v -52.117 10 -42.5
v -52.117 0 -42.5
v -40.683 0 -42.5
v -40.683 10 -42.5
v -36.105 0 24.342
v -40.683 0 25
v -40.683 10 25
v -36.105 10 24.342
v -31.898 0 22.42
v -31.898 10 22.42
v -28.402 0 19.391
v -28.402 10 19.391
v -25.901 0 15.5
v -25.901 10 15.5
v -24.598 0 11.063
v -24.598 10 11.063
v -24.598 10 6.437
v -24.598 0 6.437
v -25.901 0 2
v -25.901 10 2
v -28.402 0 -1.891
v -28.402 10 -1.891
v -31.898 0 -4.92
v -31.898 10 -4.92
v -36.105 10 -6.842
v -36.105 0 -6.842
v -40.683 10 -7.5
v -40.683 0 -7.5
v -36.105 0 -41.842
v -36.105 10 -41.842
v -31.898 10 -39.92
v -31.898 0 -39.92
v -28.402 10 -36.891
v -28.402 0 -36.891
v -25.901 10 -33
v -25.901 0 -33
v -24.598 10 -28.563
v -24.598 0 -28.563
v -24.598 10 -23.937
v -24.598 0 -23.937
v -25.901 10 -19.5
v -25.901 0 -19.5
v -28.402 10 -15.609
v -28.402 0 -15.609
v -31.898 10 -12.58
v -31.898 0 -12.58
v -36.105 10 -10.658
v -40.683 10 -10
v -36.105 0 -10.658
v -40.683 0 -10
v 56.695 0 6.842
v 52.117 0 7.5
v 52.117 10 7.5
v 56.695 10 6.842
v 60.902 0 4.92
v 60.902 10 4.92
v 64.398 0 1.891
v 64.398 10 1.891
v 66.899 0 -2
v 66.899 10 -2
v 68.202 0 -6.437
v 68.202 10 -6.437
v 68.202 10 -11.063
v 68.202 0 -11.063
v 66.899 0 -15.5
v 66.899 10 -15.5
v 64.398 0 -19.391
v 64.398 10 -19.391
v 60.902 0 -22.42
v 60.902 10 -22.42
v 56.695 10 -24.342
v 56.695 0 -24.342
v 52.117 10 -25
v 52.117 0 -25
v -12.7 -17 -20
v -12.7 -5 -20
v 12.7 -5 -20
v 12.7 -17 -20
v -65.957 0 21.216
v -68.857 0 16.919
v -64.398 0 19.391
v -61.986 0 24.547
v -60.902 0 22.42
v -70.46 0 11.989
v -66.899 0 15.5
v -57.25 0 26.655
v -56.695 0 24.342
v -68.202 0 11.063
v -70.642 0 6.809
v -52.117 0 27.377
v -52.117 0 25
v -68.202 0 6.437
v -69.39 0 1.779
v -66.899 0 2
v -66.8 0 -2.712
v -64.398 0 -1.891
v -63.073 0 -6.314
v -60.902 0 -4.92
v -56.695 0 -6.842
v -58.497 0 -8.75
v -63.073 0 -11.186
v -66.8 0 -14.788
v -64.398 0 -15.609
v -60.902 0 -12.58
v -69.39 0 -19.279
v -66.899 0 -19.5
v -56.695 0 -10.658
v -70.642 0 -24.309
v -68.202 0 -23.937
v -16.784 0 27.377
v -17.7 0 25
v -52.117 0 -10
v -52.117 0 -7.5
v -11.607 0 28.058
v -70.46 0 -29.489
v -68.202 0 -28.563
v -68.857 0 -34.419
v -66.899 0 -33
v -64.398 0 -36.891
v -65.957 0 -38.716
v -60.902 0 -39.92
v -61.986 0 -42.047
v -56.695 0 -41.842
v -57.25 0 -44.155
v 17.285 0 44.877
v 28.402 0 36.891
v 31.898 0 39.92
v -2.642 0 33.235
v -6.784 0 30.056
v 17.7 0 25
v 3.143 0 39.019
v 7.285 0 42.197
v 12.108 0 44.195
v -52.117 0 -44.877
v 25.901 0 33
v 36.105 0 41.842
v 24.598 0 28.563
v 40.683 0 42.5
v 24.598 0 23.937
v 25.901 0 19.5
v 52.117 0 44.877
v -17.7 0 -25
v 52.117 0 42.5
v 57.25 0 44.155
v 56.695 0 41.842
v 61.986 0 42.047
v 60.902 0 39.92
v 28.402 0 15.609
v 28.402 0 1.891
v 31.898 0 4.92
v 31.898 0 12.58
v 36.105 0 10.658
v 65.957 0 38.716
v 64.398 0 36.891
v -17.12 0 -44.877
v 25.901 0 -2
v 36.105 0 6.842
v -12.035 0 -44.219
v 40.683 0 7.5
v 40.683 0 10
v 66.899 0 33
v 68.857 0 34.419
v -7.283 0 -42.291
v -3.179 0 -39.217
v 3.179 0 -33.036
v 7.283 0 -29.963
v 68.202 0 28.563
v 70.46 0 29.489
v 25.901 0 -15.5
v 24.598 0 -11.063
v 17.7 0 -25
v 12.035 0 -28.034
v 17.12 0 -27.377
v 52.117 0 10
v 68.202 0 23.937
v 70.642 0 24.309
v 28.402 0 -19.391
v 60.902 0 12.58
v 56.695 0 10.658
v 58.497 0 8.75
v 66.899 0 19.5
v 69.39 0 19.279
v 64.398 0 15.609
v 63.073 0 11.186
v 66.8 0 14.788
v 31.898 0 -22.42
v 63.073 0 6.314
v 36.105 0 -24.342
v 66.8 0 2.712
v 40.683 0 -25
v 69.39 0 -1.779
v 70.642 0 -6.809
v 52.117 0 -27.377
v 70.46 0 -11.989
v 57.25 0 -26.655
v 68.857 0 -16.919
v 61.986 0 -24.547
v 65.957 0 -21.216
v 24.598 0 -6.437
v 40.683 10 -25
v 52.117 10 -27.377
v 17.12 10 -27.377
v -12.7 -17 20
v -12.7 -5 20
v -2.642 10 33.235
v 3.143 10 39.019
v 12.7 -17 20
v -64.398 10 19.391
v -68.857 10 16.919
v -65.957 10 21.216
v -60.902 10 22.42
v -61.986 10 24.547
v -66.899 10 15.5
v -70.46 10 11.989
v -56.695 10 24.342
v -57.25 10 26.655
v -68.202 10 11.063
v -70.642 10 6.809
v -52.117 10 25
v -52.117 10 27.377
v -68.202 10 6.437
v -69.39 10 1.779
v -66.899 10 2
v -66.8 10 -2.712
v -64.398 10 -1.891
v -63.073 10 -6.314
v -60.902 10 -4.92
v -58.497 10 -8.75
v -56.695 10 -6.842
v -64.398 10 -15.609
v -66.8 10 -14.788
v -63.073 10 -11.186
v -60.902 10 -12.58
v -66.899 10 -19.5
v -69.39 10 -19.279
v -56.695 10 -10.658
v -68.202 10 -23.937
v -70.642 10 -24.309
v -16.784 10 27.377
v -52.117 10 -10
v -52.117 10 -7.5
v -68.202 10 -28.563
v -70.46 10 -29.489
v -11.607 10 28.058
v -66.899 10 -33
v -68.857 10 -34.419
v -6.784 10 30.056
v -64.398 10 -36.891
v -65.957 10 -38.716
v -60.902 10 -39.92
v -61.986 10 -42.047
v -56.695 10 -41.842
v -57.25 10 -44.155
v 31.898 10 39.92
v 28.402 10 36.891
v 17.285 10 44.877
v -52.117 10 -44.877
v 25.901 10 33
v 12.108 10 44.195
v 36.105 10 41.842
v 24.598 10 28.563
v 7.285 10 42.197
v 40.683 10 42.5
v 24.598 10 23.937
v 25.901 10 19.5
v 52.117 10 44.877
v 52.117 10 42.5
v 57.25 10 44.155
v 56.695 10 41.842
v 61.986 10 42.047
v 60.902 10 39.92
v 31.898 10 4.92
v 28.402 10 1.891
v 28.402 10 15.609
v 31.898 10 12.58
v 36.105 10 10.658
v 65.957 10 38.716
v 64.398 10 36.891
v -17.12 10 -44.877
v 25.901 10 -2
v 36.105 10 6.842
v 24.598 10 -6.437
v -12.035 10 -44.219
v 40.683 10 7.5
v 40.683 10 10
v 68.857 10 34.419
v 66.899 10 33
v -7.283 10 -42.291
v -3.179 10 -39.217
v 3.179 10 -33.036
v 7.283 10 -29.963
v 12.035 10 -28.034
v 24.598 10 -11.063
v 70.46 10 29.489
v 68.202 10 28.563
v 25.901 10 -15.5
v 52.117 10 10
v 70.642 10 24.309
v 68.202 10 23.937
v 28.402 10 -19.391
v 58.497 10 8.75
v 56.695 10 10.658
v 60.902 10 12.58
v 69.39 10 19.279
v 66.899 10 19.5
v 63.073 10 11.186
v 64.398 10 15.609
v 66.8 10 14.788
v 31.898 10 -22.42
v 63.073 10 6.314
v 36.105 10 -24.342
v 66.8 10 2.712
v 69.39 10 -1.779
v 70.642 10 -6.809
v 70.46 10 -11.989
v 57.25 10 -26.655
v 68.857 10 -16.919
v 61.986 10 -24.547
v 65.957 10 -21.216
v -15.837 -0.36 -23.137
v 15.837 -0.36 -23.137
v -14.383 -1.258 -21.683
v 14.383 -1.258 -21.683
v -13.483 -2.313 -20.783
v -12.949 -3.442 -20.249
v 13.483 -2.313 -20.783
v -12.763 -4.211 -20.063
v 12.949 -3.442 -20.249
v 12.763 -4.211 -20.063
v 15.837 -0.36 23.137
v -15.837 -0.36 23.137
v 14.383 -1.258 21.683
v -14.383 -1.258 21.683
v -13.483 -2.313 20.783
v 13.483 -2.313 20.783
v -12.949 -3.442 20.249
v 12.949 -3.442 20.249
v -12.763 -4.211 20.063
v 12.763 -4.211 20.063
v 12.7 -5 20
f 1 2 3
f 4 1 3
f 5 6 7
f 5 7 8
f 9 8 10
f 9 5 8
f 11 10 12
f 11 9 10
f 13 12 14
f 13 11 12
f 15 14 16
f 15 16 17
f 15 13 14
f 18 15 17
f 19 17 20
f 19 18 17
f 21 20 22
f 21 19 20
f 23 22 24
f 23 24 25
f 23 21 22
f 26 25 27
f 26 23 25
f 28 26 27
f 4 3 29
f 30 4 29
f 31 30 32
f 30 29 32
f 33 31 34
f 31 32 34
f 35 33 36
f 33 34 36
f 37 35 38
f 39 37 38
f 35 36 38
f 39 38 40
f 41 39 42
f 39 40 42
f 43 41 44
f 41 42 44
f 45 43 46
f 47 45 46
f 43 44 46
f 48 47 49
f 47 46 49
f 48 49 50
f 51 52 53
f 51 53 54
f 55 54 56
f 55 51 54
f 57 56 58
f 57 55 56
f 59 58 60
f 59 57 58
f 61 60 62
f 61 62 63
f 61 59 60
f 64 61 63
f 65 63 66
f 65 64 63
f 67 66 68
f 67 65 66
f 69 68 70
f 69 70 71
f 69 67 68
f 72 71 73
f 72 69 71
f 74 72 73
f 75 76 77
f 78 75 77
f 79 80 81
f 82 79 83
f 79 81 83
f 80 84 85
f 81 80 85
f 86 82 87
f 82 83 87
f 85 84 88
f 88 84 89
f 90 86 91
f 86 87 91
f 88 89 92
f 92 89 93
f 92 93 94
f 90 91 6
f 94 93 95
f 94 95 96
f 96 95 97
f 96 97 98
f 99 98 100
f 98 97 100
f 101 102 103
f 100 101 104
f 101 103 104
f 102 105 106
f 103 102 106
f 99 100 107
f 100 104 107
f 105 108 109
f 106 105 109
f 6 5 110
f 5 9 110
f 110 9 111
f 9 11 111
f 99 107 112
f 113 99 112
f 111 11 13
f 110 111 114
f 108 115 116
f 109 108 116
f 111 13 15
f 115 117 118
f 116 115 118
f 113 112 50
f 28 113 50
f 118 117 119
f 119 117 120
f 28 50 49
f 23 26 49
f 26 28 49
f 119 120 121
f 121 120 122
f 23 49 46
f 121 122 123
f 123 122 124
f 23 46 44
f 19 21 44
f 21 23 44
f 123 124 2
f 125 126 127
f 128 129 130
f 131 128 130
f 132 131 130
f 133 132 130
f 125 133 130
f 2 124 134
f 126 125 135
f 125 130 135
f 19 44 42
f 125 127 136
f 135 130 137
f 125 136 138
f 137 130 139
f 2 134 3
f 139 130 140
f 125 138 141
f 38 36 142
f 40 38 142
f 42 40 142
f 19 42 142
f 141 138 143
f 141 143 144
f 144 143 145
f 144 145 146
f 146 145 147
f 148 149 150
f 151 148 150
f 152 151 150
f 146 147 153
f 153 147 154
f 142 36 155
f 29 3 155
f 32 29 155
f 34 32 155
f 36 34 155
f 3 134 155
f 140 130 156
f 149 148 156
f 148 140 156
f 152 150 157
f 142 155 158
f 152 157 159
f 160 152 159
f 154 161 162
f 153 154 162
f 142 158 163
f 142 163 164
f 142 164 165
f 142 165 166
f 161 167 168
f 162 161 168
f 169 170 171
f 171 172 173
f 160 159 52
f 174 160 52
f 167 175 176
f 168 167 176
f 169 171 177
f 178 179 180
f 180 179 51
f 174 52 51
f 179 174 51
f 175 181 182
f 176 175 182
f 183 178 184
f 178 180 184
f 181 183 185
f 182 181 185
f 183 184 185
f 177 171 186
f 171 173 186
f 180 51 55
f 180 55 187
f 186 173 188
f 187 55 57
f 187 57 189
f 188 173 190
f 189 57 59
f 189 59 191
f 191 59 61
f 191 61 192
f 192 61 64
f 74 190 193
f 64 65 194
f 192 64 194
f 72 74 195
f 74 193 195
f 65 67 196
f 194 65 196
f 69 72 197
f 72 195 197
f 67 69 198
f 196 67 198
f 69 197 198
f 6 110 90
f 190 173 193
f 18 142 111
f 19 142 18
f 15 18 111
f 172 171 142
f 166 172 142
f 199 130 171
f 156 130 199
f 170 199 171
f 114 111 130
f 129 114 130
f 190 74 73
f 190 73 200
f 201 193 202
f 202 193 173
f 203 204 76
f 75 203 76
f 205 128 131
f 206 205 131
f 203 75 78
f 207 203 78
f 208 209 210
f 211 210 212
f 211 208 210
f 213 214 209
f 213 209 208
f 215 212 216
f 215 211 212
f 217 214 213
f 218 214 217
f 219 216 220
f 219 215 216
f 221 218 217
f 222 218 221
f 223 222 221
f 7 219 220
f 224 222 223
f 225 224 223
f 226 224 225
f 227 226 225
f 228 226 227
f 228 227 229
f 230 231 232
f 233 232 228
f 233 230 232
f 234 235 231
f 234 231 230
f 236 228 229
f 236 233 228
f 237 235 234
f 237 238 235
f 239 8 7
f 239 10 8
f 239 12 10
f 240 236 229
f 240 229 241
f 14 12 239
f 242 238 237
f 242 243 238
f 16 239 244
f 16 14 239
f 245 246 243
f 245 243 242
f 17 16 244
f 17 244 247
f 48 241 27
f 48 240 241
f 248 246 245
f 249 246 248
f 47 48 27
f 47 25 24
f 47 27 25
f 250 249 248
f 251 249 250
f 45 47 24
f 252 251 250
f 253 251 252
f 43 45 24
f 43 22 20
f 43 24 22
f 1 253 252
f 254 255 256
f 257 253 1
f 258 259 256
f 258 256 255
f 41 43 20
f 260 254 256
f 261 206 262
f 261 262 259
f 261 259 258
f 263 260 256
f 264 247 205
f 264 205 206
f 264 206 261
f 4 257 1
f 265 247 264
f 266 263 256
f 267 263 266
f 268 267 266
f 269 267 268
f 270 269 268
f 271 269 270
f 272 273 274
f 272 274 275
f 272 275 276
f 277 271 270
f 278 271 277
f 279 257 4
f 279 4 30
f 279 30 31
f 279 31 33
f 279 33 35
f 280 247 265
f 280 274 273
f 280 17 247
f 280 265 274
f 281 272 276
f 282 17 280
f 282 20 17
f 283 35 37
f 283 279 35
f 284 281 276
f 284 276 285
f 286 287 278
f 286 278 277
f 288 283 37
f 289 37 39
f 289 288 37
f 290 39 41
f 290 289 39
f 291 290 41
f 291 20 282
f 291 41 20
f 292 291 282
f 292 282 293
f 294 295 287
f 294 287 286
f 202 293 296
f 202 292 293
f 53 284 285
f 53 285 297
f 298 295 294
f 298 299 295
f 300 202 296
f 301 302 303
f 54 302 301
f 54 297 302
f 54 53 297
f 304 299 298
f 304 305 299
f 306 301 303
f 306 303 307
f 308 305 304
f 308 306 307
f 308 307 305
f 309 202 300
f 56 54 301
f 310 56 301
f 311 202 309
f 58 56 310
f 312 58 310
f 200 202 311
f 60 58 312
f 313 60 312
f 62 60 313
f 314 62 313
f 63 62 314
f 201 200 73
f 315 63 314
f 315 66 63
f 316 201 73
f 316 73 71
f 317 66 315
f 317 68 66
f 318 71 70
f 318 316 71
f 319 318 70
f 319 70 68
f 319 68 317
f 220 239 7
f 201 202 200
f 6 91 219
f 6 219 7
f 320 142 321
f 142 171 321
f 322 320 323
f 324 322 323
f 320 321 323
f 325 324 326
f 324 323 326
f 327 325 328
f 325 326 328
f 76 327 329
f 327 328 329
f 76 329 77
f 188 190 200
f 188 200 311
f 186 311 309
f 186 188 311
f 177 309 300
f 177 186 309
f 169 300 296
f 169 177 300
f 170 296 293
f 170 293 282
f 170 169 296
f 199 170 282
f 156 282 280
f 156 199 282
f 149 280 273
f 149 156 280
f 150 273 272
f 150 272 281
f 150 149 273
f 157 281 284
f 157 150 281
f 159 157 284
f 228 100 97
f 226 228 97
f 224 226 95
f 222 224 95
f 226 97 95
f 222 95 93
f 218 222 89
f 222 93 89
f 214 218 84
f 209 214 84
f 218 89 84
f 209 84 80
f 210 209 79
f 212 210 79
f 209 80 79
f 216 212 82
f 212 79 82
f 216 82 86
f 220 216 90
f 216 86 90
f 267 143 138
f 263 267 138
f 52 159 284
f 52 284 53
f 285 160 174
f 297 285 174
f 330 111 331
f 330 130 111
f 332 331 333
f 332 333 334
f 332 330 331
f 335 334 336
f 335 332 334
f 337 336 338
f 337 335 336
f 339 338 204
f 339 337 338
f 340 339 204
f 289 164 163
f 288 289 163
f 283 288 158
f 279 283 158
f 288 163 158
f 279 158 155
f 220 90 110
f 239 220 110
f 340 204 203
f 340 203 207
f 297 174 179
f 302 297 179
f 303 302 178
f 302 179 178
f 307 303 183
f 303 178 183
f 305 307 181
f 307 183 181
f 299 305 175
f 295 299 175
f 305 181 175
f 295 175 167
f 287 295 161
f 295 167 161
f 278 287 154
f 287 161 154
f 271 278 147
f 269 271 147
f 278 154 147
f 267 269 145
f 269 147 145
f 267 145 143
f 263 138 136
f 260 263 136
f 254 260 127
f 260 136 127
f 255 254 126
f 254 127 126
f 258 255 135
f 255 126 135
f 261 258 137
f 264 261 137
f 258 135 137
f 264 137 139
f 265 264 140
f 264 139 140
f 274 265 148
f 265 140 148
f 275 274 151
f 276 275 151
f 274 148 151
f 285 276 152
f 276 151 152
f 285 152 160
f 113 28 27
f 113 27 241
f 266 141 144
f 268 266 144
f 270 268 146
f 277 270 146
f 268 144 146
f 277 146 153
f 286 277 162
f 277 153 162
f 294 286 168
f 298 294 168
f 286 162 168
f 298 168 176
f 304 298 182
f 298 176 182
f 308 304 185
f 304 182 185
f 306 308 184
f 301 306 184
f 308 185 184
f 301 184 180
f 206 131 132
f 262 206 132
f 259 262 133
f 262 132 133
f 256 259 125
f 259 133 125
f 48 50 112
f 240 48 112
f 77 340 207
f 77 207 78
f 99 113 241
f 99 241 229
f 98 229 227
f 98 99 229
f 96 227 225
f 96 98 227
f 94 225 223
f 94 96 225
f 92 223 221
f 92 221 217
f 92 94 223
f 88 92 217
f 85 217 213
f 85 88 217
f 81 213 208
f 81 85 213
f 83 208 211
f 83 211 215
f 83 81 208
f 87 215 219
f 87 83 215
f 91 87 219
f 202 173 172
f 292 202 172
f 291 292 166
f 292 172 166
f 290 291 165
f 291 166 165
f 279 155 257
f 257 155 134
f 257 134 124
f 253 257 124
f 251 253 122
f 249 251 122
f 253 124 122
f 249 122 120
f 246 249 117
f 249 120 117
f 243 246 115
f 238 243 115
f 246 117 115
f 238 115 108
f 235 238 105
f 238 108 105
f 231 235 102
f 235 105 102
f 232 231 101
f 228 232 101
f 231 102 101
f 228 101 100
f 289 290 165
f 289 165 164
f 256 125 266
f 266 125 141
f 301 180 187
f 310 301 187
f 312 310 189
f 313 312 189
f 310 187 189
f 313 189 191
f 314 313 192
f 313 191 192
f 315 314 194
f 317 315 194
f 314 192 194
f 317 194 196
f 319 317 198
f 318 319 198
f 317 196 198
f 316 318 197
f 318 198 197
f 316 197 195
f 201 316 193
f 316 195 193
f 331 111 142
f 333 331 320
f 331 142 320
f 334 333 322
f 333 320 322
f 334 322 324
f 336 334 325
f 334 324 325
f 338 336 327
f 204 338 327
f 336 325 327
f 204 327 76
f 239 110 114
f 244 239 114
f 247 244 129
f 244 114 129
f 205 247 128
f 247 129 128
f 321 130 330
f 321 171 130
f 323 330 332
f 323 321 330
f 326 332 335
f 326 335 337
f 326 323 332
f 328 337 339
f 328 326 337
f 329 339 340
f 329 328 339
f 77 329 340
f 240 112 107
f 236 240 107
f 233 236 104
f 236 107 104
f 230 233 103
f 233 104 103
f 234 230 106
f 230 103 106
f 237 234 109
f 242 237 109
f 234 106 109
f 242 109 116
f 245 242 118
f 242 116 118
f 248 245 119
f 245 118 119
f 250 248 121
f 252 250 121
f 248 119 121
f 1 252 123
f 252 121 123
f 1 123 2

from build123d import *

# Parameters (mm, degrees)
BOSS_EXTRUDE1_DEPTH = 10
BOSS_EXTRUDE3_START = -10
SKETCH2_W           = 25.4
SKETCH2_H           = 40
BOSS_EXTRUDE3_DEPTH = 17
FILLET2_R           = 5


with BuildPart() as part:
    # Sketch1 → Boss-Extrude1 (new body)
    with BuildSketch(Plane(origin=(0, 0, 0), x_dir=(1, 0, 0), z_dir=(0, 1, 0))):
        with BuildLine():
            Line((-40.682943279, 44.876700425), (-52.117056721, 44.876700425))
            ThreePointArc((-52.117056721, 44.876700425), (-70.45991945, 29.48934494), (-58.497022921, 8.75))
            ThreePointArc((-58.497022921, 8.75), (-70.45991945, -11.98934494), (-52.117056721, -27.376700425))
            Line((-52.117056721, -27.376700425), (-40.682943279, -27.376700425))
            Line((-40.682943279, -27.376700425), (-16.783731474, -27.376700425))
            ThreePointArc((-16.783731474, -27.376700425), (-9.130062827, -28.899109774), (-2.64159585, -33.234564801))
            Line((-2.64159585, -33.234564801), (3.142675397, -39.018836048))
            ThreePointArc((3.142675397, -39.018836048), (9.631142374, -43.354291075), (17.284811021, -44.876700425))
            Line((17.284811021, -44.876700425), (40.682943279, -44.876700425))
            Line((40.682943279, -44.876700425), (52.117056721, -44.876700425))
            ThreePointArc((52.117056721, -44.876700425), (70.45991945, -29.48934494), (58.497022921, -8.75))
            ThreePointArc((58.497022921, -8.75), (70.45991945, 11.98934494), (52.117056721, 27.376700425))
            Line((52.117056721, 27.376700425), (40.682943279, 27.376700425))
            Line((40.682943279, 27.376700425), (17.119939677, 27.376700425))
            ThreePointArc((17.119939677, 27.376700425), (9.596852719, 28.845560076), (3.17880165, 33.036384162))
            Line((3.17880165, 33.036384162), (-3.17880165, 39.217016687))
            ThreePointArc((-3.17880165, 39.217016687), (-9.596852719, 43.407840773), (-17.119939677, 44.876700425))
            Line((-17.119939677, 44.876700425), (-40.682943279, 44.876700425))
        make_face()
        with BuildLine():
            Line((-40.682943279, 10), (-52.117056721, 10))
            ThreePointArc((-52.117056721, 10), (-68.367056721, 26.25), (-52.117056721, 42.5))
            Line((-52.117056721, 42.5), (-40.682943279, 42.5))
            ThreePointArc((-40.682943279, 42.5), (-24.432943279, 26.25), (-40.682943279, 10))
        make_face(mode=Mode.SUBTRACT)
        with BuildLine():
            Line((-40.682943279, 7.5), (-52.117056721, 7.5))
            ThreePointArc((-52.117056721, 7.5), (-68.367056721, -8.75), (-52.117056721, -25))
            Line((-52.117056721, -25), (-40.682943279, -25))
            ThreePointArc((-40.682943279, -25), (-24.432943279, -8.75), (-40.682943279, 7.5))
        make_face(mode=Mode.SUBTRACT)
        with BuildLine():
            Line((40.682943279, -10), (52.117056721, -10))
            ThreePointArc((52.117056721, -10), (68.367056721, -26.25), (52.117056721, -42.5))
            Line((52.117056721, -42.5), (40.682943279, -42.5))
            ThreePointArc((40.682943279, -42.5), (24.432943279, -26.25), (40.682943279, -10))
        make_face(mode=Mode.SUBTRACT)
        with BuildLine():
            Line((40.682943279, -7.5), (52.117056721, -7.5))
            ThreePointArc((52.117056721, -7.5), (68.367056721, 8.75), (52.117056721, 25))
            Line((52.117056721, 25), (40.682943279, 25))
            ThreePointArc((40.682943279, 25), (24.432943279, 8.75), (40.682943279, -7.5))
        make_face(mode=Mode.SUBTRACT)
    extrude(amount=BOSS_EXTRUDE1_DEPTH)

    # Sketch2 → Boss-Extrude3 (add)
    with BuildSketch(Plane(origin=(0, 10, 0), x_dir=(1, 0, 0), z_dir=(0, 1, 0)).offset(BOSS_EXTRUDE3_START)):
        Rectangle(SKETCH2_W, SKETCH2_H)
    extrude(amount=-BOSS_EXTRUDE3_DEPTH)

    # Fillet2
    fillet2_edges = [part.edges().sort_by_distance(p)[0] for p in [
        (-12.7, 0, 0),
        (0, 0, 20),
        (12.7, 0, 0),
        (0, 0, -20),
    ]]
    fillet(fillet2_edges, radius=FILLET2_R)


solid = part.part
